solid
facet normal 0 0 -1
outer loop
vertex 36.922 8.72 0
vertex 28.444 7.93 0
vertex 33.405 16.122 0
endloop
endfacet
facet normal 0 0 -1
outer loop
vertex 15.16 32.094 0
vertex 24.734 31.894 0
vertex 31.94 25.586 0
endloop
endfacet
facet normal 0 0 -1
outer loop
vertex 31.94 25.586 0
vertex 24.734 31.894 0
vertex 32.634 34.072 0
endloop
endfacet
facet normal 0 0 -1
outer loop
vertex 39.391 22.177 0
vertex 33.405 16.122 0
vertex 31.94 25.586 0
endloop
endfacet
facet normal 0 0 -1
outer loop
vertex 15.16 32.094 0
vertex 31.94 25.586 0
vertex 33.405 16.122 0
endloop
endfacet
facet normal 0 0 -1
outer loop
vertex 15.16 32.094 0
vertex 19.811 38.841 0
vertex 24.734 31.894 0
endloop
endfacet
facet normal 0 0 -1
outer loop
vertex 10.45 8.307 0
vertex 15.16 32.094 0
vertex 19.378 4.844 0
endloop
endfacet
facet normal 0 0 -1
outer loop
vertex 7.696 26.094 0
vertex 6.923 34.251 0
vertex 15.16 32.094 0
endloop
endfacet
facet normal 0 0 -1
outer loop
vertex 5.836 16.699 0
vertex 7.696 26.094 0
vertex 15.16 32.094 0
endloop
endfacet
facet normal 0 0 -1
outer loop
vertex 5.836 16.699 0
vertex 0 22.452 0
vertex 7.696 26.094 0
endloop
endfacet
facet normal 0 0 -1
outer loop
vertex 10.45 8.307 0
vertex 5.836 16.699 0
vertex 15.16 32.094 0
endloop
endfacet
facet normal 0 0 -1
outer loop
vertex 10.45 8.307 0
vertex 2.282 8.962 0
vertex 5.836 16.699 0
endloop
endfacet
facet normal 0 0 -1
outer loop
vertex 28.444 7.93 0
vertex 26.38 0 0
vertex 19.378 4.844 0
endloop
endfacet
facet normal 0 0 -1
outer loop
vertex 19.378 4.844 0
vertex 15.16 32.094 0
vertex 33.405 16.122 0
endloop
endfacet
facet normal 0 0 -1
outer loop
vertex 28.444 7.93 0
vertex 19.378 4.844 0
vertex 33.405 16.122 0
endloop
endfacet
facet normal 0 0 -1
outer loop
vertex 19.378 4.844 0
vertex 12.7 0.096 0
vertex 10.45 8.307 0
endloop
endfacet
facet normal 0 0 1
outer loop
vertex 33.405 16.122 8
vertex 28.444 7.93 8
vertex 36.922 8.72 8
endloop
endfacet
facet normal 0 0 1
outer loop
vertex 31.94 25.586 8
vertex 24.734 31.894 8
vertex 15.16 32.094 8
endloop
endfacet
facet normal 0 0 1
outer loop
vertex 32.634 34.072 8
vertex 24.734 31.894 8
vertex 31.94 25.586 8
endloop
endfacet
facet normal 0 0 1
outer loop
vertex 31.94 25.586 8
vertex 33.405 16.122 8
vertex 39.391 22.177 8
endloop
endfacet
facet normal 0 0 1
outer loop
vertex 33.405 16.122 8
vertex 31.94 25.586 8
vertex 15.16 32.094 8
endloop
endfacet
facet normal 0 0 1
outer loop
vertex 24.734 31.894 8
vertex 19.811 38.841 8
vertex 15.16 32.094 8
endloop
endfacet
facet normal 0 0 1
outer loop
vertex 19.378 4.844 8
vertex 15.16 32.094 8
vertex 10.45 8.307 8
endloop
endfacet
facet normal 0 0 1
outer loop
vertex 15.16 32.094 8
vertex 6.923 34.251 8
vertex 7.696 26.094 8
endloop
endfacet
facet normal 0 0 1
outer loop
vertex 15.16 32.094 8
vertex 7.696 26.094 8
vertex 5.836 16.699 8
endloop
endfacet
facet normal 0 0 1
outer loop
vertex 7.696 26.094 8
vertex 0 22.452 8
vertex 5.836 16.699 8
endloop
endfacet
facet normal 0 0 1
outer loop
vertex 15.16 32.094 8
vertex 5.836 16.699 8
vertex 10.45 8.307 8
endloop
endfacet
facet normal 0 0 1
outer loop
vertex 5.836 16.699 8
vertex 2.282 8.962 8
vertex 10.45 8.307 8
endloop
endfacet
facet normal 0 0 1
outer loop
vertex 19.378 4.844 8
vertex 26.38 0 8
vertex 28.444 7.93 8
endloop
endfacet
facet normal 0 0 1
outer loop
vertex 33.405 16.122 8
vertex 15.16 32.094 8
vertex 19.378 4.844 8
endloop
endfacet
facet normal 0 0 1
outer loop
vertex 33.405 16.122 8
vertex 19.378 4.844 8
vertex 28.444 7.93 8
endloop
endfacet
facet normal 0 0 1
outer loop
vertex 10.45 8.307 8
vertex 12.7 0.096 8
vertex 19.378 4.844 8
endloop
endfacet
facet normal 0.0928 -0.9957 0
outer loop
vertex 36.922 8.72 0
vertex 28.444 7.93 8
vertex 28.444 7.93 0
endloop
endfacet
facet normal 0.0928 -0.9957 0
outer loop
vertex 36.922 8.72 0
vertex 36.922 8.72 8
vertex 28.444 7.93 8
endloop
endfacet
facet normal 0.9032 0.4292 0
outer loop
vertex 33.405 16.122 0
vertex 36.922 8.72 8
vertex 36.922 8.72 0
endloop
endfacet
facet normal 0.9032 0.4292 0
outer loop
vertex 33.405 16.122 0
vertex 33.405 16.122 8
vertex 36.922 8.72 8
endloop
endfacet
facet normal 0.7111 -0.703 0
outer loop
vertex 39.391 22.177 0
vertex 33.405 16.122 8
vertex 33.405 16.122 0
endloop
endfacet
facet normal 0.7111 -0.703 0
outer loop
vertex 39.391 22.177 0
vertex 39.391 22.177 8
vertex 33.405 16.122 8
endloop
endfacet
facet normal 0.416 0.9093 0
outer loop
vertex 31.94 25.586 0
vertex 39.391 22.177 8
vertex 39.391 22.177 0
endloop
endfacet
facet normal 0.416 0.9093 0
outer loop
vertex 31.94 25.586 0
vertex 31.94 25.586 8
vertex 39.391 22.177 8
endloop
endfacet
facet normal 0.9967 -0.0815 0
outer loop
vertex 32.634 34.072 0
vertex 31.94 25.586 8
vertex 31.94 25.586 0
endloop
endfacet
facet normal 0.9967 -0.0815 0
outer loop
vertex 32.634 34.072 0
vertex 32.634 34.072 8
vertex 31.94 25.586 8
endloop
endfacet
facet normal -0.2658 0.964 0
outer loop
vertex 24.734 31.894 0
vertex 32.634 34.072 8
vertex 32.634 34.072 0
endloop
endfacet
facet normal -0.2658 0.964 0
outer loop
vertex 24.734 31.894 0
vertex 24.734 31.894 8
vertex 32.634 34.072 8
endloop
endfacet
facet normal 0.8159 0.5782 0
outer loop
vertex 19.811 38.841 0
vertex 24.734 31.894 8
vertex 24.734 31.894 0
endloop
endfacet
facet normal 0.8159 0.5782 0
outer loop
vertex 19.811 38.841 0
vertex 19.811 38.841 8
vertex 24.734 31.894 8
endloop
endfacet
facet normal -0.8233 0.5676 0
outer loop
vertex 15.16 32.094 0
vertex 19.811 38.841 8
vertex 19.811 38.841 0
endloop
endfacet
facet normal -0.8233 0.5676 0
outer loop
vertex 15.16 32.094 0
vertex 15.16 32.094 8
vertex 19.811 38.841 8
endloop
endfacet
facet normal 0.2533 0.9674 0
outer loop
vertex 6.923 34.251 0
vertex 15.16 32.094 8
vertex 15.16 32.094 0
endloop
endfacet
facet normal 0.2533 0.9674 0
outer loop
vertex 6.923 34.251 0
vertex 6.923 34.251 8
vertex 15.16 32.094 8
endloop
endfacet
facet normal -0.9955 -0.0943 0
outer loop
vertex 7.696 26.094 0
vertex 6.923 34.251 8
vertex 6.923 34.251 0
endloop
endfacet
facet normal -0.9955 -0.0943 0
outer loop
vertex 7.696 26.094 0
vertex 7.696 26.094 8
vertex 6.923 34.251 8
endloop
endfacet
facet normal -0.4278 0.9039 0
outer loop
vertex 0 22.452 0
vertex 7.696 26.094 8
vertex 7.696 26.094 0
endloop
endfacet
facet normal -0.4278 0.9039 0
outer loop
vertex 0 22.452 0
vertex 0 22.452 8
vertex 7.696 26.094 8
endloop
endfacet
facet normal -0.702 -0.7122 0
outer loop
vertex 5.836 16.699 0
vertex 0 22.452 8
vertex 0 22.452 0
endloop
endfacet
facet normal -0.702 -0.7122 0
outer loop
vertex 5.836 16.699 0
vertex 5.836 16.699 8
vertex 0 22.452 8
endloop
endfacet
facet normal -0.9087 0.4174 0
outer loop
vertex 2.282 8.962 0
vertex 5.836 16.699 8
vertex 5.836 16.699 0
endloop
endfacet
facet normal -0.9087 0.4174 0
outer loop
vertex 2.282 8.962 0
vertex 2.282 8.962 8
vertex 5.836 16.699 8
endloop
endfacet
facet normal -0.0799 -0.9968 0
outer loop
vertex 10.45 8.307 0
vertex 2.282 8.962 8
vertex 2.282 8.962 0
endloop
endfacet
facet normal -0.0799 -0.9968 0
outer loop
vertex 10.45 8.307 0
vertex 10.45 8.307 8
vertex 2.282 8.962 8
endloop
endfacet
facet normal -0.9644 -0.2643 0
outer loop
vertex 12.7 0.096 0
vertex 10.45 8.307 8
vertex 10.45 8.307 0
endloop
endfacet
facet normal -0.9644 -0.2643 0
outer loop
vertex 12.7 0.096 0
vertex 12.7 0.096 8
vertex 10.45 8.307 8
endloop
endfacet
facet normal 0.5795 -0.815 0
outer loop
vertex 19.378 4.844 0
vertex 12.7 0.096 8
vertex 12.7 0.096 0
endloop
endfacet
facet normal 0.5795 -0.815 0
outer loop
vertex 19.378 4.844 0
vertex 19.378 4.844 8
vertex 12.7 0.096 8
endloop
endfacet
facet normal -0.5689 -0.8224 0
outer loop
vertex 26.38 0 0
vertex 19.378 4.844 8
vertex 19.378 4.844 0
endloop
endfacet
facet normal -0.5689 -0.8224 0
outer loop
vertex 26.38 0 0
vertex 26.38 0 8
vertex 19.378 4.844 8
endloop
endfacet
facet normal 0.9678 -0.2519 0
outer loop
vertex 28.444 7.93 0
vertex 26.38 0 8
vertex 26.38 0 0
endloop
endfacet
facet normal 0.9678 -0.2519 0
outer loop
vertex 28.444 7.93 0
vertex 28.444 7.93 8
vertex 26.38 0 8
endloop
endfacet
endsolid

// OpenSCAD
$fn = 32;

// ----------------------------------------------------------------------
// Chain sprocket: 9 teeth, 14 mm root radius
// ----------------------------------------------------------------------

// --- parameters (mm) ---
profile_height = 8;       // extrusion height
profile_points = 18;      // points of the closed outline

profile = [[33.405, 16.122], [39.391, 22.177], [31.94, 25.586], [32.634, 34.072], [24.734, 31.894], [19.811, 38.841], [15.16, 32.094], [6.923, 34.251], [7.696, 26.094], [0, 22.452], [5.836, 16.699], [2.282, 8.962], [10.45, 8.307], [12.7, 0.096], [19.378, 4.844], [26.38, 0], [28.444, 7.93], [36.922, 8.72]];  // single closed polygon, 18 points, counter clockwise

// --- the one profile operation ---
linear_extrude(height = profile_height) polygon(points = profile);
